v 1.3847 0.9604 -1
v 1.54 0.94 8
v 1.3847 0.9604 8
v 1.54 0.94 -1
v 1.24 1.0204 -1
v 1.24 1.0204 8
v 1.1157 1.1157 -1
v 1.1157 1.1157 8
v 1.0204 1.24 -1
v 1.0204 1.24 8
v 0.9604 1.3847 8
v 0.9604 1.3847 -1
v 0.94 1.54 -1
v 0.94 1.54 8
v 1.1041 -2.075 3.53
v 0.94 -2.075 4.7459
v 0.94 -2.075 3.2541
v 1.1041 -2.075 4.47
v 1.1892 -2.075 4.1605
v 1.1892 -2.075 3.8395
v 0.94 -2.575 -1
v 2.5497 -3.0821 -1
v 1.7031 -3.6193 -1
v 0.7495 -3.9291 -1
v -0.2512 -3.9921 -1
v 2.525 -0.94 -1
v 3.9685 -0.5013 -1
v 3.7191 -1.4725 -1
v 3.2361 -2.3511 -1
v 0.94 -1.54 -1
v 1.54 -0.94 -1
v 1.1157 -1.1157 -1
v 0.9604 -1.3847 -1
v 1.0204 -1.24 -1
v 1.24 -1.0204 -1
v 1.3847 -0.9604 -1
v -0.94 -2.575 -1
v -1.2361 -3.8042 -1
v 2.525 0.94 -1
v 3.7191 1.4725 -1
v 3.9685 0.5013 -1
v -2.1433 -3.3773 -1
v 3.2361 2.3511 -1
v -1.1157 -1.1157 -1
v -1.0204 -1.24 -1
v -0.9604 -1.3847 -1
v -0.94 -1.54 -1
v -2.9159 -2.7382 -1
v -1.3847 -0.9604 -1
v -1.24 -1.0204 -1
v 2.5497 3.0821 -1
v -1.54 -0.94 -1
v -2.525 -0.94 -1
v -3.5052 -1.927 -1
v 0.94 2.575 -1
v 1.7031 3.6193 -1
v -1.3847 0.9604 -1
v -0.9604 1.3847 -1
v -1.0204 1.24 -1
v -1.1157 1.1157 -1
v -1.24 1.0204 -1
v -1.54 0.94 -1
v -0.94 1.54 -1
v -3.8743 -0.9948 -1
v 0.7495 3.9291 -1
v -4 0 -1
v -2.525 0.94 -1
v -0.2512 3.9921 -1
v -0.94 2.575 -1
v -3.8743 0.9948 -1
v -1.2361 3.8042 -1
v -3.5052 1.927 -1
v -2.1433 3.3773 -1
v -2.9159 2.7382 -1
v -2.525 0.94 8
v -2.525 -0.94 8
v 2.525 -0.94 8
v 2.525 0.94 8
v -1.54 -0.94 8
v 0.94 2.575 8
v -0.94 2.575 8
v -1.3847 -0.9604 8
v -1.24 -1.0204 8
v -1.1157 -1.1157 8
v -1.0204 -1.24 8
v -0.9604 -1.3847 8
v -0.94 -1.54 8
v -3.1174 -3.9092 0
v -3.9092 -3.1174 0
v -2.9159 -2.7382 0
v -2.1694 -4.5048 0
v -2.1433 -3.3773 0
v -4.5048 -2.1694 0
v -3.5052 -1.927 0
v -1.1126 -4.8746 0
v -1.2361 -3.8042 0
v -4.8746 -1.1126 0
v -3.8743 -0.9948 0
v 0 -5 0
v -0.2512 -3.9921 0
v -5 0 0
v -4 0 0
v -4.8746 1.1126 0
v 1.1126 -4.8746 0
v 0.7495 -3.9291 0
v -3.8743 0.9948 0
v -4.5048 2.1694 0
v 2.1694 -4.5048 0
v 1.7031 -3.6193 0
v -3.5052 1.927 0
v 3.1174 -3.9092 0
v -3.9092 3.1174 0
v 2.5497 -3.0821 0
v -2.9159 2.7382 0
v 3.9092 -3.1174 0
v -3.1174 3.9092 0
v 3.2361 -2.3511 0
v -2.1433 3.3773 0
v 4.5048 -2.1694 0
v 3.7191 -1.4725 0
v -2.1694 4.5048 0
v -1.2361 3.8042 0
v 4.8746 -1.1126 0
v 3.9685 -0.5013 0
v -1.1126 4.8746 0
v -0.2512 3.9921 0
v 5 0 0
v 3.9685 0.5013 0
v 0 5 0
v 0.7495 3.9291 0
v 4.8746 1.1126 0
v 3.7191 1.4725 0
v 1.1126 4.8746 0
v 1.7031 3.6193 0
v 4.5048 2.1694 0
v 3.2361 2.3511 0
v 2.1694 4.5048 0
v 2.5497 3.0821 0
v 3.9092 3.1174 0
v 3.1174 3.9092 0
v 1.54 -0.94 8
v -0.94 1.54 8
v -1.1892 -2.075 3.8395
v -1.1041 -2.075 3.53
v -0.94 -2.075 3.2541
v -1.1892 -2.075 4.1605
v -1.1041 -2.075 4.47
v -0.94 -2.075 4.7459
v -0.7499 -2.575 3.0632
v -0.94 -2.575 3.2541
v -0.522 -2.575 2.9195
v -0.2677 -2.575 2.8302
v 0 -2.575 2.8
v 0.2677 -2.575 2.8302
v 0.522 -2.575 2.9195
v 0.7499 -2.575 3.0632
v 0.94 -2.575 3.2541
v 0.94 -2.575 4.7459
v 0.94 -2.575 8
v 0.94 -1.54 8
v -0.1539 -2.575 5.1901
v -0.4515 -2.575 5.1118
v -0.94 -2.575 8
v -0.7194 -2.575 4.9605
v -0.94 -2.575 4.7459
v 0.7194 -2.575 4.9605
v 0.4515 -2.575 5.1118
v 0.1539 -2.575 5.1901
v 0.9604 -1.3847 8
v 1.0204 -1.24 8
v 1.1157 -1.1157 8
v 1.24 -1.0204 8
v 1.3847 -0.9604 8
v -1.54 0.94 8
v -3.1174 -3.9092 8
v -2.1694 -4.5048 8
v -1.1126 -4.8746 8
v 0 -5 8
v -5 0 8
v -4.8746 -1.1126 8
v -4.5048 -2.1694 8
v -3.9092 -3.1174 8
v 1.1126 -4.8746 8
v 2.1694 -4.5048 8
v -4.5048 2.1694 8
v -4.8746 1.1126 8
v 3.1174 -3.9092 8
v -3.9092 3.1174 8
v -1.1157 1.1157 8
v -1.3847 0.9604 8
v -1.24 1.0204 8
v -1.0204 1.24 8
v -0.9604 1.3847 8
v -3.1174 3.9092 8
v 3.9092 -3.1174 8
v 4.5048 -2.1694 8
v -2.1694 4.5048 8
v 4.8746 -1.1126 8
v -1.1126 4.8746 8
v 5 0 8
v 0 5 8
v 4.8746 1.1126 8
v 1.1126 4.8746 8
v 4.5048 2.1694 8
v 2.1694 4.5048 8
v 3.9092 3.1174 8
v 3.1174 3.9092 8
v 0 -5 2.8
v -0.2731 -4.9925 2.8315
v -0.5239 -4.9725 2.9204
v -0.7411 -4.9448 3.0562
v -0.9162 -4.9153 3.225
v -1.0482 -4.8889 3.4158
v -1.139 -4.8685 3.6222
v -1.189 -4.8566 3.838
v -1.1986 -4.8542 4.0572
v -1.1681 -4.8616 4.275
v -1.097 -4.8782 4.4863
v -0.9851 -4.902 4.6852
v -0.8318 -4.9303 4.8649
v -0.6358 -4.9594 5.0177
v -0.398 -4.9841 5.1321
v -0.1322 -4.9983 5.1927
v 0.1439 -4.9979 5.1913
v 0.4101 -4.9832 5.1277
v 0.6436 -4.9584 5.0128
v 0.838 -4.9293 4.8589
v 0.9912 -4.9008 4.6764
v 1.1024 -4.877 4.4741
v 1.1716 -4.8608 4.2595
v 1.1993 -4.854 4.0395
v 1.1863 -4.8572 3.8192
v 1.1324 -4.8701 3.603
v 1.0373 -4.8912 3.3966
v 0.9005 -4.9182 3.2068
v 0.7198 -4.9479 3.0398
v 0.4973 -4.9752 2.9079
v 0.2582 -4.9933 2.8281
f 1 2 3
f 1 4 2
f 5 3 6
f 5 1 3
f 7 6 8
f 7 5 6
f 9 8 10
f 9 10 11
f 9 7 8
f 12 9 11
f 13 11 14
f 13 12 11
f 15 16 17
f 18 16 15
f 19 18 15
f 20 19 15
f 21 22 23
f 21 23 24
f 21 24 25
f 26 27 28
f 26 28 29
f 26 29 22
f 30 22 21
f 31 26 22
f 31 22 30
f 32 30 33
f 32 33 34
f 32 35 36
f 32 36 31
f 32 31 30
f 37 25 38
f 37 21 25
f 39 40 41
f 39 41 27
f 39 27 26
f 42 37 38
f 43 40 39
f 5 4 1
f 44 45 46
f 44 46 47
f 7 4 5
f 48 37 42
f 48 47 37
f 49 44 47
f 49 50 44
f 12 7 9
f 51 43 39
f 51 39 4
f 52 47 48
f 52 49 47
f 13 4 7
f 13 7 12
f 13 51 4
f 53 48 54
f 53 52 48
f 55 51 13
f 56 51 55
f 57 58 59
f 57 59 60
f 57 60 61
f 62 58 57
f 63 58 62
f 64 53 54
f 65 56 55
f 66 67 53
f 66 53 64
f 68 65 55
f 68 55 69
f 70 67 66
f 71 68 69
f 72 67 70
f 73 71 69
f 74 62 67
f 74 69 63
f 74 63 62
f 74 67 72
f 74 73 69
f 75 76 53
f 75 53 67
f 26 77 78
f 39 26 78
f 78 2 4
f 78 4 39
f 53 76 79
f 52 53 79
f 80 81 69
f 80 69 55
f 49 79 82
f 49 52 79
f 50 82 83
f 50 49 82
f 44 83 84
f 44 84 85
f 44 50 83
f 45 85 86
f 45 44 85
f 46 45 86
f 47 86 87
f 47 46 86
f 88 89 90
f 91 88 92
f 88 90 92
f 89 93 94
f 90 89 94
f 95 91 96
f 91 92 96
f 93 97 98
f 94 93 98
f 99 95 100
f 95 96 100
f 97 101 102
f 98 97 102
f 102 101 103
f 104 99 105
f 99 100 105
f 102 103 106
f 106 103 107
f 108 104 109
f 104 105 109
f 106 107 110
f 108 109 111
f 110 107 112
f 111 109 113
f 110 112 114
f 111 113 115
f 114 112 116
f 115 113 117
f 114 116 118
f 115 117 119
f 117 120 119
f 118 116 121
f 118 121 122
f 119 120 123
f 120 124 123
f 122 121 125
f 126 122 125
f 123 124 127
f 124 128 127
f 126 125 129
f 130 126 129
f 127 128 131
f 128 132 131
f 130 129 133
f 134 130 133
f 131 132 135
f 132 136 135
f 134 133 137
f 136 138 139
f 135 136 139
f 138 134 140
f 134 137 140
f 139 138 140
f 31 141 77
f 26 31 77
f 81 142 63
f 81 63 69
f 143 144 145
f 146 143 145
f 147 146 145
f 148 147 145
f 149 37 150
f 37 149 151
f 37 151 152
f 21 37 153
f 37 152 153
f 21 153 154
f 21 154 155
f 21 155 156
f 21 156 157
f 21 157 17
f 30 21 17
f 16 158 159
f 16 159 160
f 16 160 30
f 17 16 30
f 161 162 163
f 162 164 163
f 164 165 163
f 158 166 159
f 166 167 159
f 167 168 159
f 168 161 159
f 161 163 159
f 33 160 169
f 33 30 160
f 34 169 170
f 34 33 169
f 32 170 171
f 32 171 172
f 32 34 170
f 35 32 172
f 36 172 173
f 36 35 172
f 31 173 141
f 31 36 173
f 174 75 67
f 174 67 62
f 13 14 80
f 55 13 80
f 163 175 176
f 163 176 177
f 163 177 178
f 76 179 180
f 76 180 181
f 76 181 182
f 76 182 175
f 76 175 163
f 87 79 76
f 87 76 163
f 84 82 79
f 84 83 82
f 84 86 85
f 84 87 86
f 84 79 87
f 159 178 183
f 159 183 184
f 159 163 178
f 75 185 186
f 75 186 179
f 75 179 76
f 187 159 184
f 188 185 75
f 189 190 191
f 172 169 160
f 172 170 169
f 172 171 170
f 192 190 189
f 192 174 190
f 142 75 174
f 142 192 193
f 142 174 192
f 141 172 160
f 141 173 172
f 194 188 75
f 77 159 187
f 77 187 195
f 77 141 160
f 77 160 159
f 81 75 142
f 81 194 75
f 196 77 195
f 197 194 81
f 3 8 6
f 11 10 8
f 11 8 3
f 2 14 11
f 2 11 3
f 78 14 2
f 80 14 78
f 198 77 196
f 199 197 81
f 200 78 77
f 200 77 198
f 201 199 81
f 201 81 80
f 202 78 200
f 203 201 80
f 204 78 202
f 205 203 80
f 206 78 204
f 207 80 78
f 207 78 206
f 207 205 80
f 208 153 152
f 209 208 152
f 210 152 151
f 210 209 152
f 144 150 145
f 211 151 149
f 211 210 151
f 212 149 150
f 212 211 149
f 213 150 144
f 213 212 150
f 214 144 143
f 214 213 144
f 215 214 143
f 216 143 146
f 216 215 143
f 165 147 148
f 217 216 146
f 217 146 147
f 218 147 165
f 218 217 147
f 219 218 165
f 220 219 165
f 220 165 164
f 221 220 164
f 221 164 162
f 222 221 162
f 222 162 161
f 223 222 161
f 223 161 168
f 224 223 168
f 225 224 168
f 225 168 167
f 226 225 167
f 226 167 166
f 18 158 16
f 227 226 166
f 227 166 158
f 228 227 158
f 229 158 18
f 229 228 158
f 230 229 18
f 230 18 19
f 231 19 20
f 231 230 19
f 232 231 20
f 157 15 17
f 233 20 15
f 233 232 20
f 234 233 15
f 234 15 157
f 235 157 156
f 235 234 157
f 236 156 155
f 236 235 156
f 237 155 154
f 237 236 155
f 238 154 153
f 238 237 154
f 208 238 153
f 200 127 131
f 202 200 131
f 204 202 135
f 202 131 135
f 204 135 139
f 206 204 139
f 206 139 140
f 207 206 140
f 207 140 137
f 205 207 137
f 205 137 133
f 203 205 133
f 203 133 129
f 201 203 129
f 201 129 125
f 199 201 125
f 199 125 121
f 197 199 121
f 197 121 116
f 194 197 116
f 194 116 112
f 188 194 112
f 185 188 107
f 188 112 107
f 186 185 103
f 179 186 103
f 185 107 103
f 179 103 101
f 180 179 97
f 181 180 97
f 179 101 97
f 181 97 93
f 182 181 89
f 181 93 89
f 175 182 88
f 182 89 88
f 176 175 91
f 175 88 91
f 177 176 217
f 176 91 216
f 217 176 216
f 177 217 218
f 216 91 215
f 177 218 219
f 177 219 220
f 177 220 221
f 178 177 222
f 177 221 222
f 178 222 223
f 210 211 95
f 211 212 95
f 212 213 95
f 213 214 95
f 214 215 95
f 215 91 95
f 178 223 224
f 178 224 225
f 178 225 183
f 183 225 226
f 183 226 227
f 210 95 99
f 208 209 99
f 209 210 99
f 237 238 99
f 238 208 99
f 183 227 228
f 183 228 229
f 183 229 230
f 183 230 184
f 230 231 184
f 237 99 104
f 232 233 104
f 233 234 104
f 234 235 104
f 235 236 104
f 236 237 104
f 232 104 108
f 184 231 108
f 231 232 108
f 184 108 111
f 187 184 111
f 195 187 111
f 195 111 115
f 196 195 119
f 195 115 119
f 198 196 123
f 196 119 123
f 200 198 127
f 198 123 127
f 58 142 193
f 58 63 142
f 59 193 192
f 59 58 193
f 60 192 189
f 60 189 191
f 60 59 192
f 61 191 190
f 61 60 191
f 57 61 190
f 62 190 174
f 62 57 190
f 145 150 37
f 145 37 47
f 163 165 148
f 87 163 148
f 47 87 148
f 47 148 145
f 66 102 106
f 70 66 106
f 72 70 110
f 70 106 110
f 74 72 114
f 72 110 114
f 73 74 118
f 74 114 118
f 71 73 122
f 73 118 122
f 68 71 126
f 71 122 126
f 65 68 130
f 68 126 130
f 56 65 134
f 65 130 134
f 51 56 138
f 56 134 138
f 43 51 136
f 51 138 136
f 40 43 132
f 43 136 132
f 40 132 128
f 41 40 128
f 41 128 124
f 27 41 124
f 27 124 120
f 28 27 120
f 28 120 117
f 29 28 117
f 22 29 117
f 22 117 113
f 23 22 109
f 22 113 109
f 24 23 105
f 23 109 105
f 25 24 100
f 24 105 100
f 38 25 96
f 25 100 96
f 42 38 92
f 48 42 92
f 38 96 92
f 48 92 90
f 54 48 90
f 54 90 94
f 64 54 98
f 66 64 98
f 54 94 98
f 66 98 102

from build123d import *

# Parameters (mm, degrees)
SKETCH_1_R               = 5
EXTRUDE_1_DEPTH          = 8
SKETCH_4_R               = 4
EXTRUDE_2_DEPTH          = 1
SKETCH_2_W               = 5.05
SKETCH_2_H               = 1.88
SKETCH_2_W_2             = 1.88
SKETCH_2_H_2             = 5.15
CUT_EXTRUDE_1_DEPTH      = 12.445523142
FILLET_1_R               = 0.6
CUT_EXTRUDE_2_DEPTH      = 0.5
CUT_EXTRUDE_2_DEPTH_BACK = 13.098786096
SKETCH_3_R               = 1.2


with BuildPart() as part:
    # ｽｹｯﾁ1 → ﾎﾞｽ - 押し出し1 (new body)
    with BuildSketch(Plane.XY):
        Circle(SKETCH_1_R)
    extrude(amount=EXTRUDE_1_DEPTH)

    # ｽｹｯﾁ4 → ﾎﾞｽ - 押し出し2 (add)
    with BuildSketch(Plane(origin=(0, 0, 0), x_dir=(-1, 0, 0), z_dir=(0, 0, -1))):
        Circle(SKETCH_4_R)
    extrude(amount=EXTRUDE_2_DEPTH)

    # ｽｹｯﾁ2 → ｶｯﾄ - 押し出し1 (cut, through all)
    with BuildSketch(Plane.XY.offset(8)):
        Rectangle(SKETCH_2_W, SKETCH_2_H)
        Rectangle(SKETCH_2_W_2, SKETCH_2_H_2)
    extrude(amount=-CUT_EXTRUDE_1_DEPTH, mode=Mode.SUBTRACT)

    # ﾌｨﾚｯﾄ1
    fillet_1_edges = [part.edges().sort_by_distance(p)[0] for p in [
        (-0.94, 0.94, 3.5),
        (0.94, -0.94, 3.5),
        (-0.94, -0.94, 3.5),
        (0.94, 0.94, 3.5),
    ]]
    fillet(fillet_1_edges, radius=FILLET_1_R)

    # ｽｹｯﾁ3 → ｶｯﾄ - 押し出し2 (cut, two sides: drawn at the far end of the back side and taken through both)
    with BuildSketch(Plane(origin=(0, -2.575, 0), x_dir=(1, 0, 0), z_dir=(0, 1, 0)).offset(-CUT_EXTRUDE_2_DEPTH_BACK)):
        with Locations(Location((0, -4, 0), (0, 0, 90))):
            Circle(SKETCH_3_R)
    extrude(amount=CUT_EXTRUDE_2_DEPTH + CUT_EXTRUDE_2_DEPTH_BACK, mode=Mode.SUBTRACT)


solid = part.part
